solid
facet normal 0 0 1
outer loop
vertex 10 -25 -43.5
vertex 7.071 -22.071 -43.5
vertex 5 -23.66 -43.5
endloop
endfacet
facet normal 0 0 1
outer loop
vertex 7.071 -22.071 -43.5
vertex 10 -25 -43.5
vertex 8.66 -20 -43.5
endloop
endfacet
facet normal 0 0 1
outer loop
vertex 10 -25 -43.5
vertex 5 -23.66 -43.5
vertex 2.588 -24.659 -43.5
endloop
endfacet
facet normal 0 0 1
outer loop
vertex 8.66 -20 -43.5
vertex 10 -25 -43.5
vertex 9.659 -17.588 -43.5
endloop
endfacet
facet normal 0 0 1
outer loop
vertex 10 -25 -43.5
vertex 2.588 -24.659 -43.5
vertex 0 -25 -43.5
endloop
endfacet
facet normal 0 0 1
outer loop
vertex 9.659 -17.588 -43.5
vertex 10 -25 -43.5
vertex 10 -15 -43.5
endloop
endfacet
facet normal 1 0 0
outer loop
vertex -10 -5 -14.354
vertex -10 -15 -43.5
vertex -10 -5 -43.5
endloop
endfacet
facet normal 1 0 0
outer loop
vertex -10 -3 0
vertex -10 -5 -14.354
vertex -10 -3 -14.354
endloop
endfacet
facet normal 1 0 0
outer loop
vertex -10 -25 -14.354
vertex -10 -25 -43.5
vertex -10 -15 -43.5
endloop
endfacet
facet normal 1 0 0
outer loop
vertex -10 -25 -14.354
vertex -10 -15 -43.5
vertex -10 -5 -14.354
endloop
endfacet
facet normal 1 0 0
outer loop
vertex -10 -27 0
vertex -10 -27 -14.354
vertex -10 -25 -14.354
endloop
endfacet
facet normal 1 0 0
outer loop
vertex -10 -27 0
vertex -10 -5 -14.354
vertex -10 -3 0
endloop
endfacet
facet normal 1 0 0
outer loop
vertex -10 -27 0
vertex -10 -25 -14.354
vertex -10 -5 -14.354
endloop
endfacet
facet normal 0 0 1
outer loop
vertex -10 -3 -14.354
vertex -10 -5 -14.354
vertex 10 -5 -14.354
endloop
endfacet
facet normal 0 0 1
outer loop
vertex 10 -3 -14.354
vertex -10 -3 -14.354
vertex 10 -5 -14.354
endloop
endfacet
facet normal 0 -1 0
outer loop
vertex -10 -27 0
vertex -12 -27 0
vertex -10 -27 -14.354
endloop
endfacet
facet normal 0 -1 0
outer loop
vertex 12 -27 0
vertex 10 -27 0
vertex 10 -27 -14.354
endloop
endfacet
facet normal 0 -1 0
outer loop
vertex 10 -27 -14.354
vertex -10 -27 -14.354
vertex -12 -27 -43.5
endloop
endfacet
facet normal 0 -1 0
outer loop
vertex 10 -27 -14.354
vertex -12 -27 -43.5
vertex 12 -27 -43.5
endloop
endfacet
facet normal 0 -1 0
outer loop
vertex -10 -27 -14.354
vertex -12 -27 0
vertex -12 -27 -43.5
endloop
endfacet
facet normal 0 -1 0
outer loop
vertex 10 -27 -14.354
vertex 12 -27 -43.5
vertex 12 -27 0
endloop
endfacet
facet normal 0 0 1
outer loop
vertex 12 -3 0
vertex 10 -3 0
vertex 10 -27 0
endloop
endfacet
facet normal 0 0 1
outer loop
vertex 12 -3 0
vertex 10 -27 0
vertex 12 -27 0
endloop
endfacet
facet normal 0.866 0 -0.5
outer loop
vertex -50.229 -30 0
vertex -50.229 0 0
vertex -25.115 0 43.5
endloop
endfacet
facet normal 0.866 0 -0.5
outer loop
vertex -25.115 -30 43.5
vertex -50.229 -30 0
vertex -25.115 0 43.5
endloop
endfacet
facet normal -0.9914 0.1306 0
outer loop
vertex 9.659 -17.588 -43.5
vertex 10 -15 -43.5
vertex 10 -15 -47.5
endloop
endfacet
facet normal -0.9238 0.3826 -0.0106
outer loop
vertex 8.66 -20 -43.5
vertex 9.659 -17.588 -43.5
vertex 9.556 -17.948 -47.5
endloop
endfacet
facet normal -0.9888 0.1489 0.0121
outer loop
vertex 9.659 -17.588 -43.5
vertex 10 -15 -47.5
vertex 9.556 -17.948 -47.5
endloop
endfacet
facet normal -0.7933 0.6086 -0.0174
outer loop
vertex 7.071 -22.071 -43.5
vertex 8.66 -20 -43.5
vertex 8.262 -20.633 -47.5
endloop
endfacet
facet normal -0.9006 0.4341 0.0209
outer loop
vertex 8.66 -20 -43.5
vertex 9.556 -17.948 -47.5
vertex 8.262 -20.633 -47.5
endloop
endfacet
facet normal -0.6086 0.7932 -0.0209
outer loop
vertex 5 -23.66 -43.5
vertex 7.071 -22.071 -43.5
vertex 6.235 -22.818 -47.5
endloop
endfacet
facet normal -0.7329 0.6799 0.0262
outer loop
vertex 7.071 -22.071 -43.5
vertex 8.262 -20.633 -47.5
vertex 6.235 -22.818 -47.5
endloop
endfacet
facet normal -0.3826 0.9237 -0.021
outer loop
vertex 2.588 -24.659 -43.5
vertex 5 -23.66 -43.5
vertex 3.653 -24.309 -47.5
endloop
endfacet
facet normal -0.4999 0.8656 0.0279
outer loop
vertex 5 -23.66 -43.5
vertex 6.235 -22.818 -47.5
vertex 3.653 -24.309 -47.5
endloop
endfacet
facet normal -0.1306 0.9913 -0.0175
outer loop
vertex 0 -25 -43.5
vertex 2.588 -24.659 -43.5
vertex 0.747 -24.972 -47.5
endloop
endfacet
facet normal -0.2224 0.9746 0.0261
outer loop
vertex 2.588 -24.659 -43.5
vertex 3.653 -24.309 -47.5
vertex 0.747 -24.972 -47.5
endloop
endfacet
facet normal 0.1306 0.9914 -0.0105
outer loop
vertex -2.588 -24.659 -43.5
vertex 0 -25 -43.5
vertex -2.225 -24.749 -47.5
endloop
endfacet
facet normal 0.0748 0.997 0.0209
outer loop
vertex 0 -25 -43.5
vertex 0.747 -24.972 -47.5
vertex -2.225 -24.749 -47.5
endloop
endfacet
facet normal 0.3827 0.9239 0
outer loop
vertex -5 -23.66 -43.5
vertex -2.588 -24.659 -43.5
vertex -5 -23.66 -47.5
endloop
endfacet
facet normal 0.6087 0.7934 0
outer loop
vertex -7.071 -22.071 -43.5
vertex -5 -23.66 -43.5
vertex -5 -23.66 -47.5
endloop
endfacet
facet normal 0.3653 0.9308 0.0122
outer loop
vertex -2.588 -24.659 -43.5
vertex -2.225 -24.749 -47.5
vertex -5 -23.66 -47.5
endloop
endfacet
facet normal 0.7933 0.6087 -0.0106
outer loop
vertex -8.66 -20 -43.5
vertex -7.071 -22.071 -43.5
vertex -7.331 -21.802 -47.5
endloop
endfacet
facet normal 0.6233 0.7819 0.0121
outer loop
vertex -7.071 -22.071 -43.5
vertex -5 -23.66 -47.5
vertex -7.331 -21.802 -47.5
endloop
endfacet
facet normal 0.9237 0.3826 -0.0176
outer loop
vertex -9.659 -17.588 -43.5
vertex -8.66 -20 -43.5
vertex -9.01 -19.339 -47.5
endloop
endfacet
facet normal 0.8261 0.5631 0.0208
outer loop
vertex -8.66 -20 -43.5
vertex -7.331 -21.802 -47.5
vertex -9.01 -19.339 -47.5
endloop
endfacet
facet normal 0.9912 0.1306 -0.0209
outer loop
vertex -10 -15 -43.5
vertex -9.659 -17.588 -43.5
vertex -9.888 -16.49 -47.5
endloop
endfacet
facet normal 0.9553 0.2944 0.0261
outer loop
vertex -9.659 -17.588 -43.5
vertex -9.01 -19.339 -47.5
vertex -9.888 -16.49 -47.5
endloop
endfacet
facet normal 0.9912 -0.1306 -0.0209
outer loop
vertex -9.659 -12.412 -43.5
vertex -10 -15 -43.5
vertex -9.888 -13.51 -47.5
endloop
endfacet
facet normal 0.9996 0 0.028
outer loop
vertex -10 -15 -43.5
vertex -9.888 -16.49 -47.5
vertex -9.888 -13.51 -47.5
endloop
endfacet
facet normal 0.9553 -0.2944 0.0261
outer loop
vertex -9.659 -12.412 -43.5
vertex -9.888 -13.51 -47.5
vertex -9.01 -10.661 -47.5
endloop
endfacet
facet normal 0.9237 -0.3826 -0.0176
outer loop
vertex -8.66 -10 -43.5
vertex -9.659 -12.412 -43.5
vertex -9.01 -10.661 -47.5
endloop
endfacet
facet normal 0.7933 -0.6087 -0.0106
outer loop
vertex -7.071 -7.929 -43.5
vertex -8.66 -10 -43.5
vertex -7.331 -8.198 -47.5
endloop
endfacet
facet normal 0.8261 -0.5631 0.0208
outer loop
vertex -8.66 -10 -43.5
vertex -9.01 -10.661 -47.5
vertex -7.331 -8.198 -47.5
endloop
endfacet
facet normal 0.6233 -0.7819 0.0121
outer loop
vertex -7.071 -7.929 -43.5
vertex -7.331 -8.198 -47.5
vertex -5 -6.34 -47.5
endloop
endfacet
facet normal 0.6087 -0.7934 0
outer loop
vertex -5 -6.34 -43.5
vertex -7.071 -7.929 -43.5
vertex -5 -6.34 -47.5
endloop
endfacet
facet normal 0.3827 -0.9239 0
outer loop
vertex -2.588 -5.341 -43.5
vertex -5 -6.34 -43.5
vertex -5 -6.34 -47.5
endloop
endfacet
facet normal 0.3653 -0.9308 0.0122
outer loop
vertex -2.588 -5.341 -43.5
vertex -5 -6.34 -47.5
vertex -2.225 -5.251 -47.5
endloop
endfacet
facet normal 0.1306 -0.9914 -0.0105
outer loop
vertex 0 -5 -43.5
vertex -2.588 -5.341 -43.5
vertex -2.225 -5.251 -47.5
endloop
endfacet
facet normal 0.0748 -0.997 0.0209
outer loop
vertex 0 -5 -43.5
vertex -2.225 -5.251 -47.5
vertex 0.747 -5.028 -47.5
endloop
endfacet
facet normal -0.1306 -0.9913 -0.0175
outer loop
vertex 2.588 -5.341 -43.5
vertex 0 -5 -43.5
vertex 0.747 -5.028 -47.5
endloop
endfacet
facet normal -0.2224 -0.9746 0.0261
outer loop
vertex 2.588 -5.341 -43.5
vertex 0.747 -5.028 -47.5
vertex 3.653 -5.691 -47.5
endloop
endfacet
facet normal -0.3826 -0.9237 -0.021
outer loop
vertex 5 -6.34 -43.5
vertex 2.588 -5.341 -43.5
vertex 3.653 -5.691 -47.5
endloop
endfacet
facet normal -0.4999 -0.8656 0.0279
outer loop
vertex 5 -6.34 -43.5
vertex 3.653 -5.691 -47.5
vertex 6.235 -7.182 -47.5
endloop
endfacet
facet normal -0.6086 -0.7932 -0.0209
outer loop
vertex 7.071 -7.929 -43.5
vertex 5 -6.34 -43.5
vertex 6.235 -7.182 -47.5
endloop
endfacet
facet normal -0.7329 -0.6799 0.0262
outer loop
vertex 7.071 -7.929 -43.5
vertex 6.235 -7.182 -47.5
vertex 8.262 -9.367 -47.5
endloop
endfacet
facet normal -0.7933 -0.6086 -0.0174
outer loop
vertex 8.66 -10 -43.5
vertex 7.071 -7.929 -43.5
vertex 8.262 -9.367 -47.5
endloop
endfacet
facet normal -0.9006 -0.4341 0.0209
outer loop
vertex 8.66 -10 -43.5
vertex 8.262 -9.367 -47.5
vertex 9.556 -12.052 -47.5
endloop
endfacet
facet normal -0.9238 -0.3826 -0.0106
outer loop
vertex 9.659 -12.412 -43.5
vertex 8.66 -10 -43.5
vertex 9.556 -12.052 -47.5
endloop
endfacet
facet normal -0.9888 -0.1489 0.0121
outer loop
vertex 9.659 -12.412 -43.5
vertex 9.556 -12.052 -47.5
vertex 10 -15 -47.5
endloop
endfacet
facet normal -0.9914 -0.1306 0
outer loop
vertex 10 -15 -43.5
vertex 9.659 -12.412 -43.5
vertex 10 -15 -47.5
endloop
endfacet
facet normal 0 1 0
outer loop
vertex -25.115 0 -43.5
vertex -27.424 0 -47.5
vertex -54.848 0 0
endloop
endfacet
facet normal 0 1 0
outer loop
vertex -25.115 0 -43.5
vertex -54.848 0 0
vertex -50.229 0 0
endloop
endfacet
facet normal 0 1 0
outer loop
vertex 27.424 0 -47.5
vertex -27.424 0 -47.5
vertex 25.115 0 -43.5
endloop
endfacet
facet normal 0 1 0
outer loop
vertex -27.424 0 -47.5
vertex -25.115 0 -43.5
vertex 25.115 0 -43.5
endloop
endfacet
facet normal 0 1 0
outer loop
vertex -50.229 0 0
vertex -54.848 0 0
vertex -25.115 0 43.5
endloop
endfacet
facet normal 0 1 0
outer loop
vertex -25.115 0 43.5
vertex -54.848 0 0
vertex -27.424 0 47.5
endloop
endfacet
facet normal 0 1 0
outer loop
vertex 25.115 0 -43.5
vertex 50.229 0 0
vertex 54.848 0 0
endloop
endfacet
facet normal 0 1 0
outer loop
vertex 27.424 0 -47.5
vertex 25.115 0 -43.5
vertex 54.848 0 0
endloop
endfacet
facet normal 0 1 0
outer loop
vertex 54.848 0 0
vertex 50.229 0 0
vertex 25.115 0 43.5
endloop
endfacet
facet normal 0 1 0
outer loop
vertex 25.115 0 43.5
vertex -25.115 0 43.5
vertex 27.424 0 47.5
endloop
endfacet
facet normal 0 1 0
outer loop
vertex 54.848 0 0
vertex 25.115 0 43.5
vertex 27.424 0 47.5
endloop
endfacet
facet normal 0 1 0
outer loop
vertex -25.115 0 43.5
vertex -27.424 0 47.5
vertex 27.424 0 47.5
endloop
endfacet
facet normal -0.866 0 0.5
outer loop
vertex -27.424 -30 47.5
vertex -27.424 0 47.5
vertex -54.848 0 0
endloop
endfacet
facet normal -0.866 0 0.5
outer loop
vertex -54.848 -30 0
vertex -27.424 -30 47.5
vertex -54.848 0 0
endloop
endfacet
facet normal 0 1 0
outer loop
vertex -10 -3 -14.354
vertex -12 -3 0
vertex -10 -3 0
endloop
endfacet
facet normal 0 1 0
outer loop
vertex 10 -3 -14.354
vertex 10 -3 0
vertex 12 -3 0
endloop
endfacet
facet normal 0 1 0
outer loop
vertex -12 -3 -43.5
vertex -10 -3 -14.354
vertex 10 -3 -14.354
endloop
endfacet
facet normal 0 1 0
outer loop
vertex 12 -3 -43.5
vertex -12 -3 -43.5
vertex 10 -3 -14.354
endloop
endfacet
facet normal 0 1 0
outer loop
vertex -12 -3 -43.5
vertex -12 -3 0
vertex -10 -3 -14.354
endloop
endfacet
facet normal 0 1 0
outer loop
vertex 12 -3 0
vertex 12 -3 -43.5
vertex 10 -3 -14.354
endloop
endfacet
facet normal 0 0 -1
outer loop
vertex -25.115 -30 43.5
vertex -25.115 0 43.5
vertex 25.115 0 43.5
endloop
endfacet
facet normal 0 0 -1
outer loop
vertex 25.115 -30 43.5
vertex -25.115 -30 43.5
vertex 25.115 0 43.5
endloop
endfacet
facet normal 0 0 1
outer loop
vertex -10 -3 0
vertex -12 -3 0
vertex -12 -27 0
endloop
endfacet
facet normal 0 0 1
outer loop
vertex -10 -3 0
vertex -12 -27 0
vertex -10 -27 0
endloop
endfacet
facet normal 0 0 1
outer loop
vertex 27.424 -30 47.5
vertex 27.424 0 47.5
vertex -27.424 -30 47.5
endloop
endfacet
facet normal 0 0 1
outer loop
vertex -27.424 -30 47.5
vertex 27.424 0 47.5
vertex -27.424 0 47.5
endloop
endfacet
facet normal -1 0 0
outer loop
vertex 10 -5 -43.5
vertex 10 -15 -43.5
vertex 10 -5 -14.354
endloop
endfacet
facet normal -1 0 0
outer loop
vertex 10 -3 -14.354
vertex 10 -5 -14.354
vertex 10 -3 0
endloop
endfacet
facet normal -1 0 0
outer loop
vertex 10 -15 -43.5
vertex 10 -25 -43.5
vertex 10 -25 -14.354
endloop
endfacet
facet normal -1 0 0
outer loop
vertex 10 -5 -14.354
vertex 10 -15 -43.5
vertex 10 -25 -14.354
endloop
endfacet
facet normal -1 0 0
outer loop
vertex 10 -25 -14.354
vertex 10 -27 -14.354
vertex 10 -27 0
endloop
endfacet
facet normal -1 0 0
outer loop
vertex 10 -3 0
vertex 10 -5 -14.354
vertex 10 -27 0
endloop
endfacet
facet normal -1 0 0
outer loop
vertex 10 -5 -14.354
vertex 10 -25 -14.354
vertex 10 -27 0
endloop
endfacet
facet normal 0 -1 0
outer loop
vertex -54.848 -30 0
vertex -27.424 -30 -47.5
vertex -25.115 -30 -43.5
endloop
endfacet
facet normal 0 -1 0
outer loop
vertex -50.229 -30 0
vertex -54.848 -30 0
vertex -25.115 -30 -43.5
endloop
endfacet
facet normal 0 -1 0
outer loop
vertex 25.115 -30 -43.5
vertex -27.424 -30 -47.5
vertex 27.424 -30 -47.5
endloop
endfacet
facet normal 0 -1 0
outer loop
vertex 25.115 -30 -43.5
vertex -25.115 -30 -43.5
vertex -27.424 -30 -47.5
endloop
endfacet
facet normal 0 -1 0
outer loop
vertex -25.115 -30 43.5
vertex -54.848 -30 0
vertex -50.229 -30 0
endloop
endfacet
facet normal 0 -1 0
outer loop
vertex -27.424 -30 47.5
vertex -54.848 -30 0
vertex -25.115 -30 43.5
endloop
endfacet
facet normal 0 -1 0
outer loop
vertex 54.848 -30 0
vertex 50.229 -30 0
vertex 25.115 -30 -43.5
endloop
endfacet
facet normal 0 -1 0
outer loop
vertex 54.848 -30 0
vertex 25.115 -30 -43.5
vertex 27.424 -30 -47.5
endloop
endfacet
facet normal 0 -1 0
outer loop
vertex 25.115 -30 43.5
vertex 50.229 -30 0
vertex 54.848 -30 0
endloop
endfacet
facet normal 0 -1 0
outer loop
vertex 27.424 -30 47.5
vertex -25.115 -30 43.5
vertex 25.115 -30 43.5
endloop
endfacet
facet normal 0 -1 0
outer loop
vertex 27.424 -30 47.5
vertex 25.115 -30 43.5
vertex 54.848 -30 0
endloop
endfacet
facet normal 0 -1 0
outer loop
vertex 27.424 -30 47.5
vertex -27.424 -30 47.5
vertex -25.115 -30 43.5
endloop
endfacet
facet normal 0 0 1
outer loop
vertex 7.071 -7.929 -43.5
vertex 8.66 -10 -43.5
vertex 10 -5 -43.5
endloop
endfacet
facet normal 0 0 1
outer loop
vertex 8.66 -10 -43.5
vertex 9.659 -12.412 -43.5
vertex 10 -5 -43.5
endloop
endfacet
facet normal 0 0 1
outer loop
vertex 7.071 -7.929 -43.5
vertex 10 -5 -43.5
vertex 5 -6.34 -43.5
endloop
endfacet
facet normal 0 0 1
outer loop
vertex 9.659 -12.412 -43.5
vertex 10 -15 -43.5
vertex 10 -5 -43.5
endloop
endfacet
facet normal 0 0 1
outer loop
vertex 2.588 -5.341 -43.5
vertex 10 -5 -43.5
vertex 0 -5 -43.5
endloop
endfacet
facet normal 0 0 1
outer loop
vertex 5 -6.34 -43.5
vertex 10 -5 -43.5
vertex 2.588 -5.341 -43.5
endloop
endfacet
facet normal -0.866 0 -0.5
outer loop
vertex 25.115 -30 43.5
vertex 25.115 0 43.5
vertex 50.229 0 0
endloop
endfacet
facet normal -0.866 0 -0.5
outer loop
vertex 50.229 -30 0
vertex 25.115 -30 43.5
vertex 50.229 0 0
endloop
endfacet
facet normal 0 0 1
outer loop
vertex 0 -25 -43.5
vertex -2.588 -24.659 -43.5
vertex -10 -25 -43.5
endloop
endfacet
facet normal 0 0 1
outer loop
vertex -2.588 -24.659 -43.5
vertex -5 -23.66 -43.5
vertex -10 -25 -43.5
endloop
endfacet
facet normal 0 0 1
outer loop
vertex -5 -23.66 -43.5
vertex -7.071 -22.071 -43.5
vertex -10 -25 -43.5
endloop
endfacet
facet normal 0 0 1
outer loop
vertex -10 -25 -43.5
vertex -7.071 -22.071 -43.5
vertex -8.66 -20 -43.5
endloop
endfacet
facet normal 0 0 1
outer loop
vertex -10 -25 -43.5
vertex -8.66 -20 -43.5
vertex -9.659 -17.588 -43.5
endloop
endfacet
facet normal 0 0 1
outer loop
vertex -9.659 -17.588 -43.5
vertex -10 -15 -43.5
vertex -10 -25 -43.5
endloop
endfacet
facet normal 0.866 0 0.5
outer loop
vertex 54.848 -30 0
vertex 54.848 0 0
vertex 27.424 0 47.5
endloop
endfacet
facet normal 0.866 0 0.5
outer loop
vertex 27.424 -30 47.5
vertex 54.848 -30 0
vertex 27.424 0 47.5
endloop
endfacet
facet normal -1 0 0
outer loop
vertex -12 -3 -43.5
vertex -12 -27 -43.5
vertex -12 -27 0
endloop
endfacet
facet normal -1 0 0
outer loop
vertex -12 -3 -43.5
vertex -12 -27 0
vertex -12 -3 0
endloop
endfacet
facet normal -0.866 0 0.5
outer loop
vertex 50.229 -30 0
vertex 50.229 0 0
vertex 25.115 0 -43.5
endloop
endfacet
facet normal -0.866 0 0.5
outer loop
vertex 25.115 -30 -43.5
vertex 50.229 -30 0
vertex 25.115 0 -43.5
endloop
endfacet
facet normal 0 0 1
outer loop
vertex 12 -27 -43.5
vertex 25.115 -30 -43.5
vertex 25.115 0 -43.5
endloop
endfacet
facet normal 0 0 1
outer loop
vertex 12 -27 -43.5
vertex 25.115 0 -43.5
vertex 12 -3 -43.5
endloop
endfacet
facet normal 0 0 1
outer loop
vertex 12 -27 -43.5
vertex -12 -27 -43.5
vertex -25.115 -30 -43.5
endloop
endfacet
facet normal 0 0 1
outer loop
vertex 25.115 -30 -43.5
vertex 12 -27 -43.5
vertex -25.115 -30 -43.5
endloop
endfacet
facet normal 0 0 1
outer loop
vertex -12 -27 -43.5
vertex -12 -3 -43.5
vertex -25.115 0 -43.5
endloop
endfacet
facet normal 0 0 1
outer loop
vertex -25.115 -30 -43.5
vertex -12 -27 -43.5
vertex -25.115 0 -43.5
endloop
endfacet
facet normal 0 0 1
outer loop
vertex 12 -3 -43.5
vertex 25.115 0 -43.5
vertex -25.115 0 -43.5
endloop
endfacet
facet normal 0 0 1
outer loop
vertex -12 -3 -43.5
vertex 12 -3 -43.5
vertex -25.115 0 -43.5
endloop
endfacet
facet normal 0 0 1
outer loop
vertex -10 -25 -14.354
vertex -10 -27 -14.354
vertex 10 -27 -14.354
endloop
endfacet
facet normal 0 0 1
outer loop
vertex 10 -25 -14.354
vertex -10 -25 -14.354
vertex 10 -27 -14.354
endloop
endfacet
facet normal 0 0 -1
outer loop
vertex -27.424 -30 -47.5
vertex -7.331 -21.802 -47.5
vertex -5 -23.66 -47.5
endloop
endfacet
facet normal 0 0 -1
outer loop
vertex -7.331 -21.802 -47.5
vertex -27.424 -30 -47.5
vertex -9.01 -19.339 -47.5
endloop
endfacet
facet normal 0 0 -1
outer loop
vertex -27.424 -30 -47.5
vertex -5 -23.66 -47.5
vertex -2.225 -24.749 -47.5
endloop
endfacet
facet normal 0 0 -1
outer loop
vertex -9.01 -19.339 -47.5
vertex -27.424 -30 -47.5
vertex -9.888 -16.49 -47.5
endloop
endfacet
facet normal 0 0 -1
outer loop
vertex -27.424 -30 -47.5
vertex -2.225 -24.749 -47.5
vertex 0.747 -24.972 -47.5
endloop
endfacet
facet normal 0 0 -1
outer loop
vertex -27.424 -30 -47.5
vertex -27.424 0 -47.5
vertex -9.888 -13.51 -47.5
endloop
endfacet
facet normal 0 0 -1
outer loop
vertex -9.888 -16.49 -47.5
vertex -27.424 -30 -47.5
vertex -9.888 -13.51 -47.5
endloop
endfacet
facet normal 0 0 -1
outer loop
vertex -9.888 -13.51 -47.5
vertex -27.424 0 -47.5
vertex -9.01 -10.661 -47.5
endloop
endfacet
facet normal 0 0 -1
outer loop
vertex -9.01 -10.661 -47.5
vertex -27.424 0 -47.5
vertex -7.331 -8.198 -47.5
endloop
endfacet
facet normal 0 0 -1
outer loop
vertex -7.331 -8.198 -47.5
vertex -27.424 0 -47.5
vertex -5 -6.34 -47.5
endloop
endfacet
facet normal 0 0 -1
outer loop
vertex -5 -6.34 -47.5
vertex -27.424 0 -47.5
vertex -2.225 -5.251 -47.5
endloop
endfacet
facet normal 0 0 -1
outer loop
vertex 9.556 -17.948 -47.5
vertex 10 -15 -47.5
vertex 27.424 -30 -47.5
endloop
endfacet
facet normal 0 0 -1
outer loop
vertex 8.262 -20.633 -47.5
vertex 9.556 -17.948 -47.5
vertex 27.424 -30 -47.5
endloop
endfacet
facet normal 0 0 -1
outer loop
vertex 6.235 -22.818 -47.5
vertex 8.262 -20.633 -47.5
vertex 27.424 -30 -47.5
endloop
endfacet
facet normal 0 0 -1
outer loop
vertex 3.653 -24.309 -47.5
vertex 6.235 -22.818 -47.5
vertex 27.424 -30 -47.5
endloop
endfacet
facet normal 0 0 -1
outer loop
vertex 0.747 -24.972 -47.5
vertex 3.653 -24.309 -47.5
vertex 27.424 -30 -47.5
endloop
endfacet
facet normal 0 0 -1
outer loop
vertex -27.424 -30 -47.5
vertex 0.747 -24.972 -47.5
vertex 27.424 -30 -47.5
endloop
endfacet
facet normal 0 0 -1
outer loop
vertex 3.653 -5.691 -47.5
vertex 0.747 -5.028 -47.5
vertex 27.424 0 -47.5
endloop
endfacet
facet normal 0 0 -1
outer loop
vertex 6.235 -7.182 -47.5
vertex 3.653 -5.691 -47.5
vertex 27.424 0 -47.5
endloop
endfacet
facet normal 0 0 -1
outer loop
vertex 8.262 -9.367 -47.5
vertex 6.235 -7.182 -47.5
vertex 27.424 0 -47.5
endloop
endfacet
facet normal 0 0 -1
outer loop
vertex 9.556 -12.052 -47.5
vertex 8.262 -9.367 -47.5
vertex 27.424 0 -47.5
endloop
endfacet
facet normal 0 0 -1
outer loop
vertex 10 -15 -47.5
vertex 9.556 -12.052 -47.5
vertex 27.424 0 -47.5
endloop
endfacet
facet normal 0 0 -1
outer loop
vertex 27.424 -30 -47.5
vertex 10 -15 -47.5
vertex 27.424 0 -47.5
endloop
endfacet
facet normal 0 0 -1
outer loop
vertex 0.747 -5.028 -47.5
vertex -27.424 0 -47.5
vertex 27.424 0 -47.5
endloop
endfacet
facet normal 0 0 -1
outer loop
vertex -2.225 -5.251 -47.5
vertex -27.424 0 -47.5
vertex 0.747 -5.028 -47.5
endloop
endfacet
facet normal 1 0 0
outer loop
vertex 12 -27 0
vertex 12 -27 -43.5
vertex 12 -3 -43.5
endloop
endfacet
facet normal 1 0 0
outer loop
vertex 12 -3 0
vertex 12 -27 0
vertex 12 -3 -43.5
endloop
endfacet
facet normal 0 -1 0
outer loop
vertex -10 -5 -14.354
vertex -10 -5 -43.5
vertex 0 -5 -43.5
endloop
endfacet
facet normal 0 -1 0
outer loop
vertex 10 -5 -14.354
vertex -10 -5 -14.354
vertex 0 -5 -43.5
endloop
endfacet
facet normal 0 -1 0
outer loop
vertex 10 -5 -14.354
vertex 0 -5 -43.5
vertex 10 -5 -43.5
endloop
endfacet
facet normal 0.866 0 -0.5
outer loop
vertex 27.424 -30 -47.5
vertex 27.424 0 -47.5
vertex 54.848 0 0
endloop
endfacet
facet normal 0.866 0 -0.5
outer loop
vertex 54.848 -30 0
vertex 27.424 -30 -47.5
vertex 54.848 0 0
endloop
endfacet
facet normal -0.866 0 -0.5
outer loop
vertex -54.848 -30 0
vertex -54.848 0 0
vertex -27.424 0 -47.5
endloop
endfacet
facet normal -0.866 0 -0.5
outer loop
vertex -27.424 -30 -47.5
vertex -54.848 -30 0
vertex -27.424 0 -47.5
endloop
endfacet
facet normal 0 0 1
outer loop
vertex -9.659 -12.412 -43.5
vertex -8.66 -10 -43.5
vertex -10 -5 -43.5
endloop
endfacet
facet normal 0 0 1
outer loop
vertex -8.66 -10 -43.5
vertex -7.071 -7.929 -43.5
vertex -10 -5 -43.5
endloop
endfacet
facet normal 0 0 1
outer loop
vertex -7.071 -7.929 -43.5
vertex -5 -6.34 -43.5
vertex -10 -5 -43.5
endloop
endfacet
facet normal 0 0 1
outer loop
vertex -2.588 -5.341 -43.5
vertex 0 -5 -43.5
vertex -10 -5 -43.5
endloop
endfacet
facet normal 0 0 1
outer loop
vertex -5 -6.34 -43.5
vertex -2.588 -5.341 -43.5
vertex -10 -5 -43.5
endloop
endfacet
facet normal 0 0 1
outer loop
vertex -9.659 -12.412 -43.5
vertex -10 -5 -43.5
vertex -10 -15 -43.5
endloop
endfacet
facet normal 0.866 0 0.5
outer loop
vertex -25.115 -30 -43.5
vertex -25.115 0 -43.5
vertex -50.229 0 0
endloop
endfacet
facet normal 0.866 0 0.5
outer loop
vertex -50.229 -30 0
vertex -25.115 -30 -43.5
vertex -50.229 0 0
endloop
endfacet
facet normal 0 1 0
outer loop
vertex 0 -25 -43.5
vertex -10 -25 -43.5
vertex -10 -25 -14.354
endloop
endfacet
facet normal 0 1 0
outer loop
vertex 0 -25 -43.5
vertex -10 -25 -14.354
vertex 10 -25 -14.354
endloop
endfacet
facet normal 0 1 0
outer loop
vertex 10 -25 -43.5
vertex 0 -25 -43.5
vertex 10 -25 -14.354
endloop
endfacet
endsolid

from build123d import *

# Parameters (mm, degrees)
F1_DEPTH = 30
F2_R     = 10
F3_DEPTH = 4
F4_W     = 24
F4_H     = 24
F4_W_2   = 20
F4_H_2   = 20
F5_DEPTH = 43.5
F6_W     = 20
F6_H     = 14.353989
F7_DEPTH = 28.1


with BuildPart() as f1:
    # F0 (on Front) → F1 (new body)
    with BuildSketch(Plane.XZ):
        Polygon((-27.424138, -47.5), (27.424138, -47.5), (54.848276, 0), (27.424138, 47.5), (-27.424138, 47.5), (-54.848276, 0), align=None)
        Polygon((50.229473, 0), (25.114737, -43.5), (-25.114737, -43.5), (-50.229473, 0), (-25.114737, 43.5), (25.114737, 43.5), align=None, mode=Mode.SUBTRACT)
    extrude(amount=F1_DEPTH)

    # F2 (on face) → F3 (cut, through all)
    with BuildSketch(Plane(origin=(0, 0, -47.5), x_dir=(1, 0, 0), z_dir=(0, 0, -1))):
        with Locations((0, 15)):
            Circle(F2_R)
    extrude(amount=-F3_DEPTH, mode=Mode.SUBTRACT)

    # F4 (on face) → F5 (join)
    with BuildSketch(Plane.XY.offset(-43.5)):
        with Locations((0, -15)):
            Rectangle(F4_W, F4_H)
        with Locations((0, -15)):
            Rectangle(F4_W_2, F4_H_2, mode=Mode.SUBTRACT)
    extrude(amount=F5_DEPTH)

    # F6 (on face) → F7 (cut)
    with BuildSketch(Plane.XZ.offset(27)):
        with Locations((0, -7.176994)):
            Rectangle(F6_W, F6_H)
    extrude(amount=-F7_DEPTH, mode=Mode.SUBTRACT)


solid = f1.part
